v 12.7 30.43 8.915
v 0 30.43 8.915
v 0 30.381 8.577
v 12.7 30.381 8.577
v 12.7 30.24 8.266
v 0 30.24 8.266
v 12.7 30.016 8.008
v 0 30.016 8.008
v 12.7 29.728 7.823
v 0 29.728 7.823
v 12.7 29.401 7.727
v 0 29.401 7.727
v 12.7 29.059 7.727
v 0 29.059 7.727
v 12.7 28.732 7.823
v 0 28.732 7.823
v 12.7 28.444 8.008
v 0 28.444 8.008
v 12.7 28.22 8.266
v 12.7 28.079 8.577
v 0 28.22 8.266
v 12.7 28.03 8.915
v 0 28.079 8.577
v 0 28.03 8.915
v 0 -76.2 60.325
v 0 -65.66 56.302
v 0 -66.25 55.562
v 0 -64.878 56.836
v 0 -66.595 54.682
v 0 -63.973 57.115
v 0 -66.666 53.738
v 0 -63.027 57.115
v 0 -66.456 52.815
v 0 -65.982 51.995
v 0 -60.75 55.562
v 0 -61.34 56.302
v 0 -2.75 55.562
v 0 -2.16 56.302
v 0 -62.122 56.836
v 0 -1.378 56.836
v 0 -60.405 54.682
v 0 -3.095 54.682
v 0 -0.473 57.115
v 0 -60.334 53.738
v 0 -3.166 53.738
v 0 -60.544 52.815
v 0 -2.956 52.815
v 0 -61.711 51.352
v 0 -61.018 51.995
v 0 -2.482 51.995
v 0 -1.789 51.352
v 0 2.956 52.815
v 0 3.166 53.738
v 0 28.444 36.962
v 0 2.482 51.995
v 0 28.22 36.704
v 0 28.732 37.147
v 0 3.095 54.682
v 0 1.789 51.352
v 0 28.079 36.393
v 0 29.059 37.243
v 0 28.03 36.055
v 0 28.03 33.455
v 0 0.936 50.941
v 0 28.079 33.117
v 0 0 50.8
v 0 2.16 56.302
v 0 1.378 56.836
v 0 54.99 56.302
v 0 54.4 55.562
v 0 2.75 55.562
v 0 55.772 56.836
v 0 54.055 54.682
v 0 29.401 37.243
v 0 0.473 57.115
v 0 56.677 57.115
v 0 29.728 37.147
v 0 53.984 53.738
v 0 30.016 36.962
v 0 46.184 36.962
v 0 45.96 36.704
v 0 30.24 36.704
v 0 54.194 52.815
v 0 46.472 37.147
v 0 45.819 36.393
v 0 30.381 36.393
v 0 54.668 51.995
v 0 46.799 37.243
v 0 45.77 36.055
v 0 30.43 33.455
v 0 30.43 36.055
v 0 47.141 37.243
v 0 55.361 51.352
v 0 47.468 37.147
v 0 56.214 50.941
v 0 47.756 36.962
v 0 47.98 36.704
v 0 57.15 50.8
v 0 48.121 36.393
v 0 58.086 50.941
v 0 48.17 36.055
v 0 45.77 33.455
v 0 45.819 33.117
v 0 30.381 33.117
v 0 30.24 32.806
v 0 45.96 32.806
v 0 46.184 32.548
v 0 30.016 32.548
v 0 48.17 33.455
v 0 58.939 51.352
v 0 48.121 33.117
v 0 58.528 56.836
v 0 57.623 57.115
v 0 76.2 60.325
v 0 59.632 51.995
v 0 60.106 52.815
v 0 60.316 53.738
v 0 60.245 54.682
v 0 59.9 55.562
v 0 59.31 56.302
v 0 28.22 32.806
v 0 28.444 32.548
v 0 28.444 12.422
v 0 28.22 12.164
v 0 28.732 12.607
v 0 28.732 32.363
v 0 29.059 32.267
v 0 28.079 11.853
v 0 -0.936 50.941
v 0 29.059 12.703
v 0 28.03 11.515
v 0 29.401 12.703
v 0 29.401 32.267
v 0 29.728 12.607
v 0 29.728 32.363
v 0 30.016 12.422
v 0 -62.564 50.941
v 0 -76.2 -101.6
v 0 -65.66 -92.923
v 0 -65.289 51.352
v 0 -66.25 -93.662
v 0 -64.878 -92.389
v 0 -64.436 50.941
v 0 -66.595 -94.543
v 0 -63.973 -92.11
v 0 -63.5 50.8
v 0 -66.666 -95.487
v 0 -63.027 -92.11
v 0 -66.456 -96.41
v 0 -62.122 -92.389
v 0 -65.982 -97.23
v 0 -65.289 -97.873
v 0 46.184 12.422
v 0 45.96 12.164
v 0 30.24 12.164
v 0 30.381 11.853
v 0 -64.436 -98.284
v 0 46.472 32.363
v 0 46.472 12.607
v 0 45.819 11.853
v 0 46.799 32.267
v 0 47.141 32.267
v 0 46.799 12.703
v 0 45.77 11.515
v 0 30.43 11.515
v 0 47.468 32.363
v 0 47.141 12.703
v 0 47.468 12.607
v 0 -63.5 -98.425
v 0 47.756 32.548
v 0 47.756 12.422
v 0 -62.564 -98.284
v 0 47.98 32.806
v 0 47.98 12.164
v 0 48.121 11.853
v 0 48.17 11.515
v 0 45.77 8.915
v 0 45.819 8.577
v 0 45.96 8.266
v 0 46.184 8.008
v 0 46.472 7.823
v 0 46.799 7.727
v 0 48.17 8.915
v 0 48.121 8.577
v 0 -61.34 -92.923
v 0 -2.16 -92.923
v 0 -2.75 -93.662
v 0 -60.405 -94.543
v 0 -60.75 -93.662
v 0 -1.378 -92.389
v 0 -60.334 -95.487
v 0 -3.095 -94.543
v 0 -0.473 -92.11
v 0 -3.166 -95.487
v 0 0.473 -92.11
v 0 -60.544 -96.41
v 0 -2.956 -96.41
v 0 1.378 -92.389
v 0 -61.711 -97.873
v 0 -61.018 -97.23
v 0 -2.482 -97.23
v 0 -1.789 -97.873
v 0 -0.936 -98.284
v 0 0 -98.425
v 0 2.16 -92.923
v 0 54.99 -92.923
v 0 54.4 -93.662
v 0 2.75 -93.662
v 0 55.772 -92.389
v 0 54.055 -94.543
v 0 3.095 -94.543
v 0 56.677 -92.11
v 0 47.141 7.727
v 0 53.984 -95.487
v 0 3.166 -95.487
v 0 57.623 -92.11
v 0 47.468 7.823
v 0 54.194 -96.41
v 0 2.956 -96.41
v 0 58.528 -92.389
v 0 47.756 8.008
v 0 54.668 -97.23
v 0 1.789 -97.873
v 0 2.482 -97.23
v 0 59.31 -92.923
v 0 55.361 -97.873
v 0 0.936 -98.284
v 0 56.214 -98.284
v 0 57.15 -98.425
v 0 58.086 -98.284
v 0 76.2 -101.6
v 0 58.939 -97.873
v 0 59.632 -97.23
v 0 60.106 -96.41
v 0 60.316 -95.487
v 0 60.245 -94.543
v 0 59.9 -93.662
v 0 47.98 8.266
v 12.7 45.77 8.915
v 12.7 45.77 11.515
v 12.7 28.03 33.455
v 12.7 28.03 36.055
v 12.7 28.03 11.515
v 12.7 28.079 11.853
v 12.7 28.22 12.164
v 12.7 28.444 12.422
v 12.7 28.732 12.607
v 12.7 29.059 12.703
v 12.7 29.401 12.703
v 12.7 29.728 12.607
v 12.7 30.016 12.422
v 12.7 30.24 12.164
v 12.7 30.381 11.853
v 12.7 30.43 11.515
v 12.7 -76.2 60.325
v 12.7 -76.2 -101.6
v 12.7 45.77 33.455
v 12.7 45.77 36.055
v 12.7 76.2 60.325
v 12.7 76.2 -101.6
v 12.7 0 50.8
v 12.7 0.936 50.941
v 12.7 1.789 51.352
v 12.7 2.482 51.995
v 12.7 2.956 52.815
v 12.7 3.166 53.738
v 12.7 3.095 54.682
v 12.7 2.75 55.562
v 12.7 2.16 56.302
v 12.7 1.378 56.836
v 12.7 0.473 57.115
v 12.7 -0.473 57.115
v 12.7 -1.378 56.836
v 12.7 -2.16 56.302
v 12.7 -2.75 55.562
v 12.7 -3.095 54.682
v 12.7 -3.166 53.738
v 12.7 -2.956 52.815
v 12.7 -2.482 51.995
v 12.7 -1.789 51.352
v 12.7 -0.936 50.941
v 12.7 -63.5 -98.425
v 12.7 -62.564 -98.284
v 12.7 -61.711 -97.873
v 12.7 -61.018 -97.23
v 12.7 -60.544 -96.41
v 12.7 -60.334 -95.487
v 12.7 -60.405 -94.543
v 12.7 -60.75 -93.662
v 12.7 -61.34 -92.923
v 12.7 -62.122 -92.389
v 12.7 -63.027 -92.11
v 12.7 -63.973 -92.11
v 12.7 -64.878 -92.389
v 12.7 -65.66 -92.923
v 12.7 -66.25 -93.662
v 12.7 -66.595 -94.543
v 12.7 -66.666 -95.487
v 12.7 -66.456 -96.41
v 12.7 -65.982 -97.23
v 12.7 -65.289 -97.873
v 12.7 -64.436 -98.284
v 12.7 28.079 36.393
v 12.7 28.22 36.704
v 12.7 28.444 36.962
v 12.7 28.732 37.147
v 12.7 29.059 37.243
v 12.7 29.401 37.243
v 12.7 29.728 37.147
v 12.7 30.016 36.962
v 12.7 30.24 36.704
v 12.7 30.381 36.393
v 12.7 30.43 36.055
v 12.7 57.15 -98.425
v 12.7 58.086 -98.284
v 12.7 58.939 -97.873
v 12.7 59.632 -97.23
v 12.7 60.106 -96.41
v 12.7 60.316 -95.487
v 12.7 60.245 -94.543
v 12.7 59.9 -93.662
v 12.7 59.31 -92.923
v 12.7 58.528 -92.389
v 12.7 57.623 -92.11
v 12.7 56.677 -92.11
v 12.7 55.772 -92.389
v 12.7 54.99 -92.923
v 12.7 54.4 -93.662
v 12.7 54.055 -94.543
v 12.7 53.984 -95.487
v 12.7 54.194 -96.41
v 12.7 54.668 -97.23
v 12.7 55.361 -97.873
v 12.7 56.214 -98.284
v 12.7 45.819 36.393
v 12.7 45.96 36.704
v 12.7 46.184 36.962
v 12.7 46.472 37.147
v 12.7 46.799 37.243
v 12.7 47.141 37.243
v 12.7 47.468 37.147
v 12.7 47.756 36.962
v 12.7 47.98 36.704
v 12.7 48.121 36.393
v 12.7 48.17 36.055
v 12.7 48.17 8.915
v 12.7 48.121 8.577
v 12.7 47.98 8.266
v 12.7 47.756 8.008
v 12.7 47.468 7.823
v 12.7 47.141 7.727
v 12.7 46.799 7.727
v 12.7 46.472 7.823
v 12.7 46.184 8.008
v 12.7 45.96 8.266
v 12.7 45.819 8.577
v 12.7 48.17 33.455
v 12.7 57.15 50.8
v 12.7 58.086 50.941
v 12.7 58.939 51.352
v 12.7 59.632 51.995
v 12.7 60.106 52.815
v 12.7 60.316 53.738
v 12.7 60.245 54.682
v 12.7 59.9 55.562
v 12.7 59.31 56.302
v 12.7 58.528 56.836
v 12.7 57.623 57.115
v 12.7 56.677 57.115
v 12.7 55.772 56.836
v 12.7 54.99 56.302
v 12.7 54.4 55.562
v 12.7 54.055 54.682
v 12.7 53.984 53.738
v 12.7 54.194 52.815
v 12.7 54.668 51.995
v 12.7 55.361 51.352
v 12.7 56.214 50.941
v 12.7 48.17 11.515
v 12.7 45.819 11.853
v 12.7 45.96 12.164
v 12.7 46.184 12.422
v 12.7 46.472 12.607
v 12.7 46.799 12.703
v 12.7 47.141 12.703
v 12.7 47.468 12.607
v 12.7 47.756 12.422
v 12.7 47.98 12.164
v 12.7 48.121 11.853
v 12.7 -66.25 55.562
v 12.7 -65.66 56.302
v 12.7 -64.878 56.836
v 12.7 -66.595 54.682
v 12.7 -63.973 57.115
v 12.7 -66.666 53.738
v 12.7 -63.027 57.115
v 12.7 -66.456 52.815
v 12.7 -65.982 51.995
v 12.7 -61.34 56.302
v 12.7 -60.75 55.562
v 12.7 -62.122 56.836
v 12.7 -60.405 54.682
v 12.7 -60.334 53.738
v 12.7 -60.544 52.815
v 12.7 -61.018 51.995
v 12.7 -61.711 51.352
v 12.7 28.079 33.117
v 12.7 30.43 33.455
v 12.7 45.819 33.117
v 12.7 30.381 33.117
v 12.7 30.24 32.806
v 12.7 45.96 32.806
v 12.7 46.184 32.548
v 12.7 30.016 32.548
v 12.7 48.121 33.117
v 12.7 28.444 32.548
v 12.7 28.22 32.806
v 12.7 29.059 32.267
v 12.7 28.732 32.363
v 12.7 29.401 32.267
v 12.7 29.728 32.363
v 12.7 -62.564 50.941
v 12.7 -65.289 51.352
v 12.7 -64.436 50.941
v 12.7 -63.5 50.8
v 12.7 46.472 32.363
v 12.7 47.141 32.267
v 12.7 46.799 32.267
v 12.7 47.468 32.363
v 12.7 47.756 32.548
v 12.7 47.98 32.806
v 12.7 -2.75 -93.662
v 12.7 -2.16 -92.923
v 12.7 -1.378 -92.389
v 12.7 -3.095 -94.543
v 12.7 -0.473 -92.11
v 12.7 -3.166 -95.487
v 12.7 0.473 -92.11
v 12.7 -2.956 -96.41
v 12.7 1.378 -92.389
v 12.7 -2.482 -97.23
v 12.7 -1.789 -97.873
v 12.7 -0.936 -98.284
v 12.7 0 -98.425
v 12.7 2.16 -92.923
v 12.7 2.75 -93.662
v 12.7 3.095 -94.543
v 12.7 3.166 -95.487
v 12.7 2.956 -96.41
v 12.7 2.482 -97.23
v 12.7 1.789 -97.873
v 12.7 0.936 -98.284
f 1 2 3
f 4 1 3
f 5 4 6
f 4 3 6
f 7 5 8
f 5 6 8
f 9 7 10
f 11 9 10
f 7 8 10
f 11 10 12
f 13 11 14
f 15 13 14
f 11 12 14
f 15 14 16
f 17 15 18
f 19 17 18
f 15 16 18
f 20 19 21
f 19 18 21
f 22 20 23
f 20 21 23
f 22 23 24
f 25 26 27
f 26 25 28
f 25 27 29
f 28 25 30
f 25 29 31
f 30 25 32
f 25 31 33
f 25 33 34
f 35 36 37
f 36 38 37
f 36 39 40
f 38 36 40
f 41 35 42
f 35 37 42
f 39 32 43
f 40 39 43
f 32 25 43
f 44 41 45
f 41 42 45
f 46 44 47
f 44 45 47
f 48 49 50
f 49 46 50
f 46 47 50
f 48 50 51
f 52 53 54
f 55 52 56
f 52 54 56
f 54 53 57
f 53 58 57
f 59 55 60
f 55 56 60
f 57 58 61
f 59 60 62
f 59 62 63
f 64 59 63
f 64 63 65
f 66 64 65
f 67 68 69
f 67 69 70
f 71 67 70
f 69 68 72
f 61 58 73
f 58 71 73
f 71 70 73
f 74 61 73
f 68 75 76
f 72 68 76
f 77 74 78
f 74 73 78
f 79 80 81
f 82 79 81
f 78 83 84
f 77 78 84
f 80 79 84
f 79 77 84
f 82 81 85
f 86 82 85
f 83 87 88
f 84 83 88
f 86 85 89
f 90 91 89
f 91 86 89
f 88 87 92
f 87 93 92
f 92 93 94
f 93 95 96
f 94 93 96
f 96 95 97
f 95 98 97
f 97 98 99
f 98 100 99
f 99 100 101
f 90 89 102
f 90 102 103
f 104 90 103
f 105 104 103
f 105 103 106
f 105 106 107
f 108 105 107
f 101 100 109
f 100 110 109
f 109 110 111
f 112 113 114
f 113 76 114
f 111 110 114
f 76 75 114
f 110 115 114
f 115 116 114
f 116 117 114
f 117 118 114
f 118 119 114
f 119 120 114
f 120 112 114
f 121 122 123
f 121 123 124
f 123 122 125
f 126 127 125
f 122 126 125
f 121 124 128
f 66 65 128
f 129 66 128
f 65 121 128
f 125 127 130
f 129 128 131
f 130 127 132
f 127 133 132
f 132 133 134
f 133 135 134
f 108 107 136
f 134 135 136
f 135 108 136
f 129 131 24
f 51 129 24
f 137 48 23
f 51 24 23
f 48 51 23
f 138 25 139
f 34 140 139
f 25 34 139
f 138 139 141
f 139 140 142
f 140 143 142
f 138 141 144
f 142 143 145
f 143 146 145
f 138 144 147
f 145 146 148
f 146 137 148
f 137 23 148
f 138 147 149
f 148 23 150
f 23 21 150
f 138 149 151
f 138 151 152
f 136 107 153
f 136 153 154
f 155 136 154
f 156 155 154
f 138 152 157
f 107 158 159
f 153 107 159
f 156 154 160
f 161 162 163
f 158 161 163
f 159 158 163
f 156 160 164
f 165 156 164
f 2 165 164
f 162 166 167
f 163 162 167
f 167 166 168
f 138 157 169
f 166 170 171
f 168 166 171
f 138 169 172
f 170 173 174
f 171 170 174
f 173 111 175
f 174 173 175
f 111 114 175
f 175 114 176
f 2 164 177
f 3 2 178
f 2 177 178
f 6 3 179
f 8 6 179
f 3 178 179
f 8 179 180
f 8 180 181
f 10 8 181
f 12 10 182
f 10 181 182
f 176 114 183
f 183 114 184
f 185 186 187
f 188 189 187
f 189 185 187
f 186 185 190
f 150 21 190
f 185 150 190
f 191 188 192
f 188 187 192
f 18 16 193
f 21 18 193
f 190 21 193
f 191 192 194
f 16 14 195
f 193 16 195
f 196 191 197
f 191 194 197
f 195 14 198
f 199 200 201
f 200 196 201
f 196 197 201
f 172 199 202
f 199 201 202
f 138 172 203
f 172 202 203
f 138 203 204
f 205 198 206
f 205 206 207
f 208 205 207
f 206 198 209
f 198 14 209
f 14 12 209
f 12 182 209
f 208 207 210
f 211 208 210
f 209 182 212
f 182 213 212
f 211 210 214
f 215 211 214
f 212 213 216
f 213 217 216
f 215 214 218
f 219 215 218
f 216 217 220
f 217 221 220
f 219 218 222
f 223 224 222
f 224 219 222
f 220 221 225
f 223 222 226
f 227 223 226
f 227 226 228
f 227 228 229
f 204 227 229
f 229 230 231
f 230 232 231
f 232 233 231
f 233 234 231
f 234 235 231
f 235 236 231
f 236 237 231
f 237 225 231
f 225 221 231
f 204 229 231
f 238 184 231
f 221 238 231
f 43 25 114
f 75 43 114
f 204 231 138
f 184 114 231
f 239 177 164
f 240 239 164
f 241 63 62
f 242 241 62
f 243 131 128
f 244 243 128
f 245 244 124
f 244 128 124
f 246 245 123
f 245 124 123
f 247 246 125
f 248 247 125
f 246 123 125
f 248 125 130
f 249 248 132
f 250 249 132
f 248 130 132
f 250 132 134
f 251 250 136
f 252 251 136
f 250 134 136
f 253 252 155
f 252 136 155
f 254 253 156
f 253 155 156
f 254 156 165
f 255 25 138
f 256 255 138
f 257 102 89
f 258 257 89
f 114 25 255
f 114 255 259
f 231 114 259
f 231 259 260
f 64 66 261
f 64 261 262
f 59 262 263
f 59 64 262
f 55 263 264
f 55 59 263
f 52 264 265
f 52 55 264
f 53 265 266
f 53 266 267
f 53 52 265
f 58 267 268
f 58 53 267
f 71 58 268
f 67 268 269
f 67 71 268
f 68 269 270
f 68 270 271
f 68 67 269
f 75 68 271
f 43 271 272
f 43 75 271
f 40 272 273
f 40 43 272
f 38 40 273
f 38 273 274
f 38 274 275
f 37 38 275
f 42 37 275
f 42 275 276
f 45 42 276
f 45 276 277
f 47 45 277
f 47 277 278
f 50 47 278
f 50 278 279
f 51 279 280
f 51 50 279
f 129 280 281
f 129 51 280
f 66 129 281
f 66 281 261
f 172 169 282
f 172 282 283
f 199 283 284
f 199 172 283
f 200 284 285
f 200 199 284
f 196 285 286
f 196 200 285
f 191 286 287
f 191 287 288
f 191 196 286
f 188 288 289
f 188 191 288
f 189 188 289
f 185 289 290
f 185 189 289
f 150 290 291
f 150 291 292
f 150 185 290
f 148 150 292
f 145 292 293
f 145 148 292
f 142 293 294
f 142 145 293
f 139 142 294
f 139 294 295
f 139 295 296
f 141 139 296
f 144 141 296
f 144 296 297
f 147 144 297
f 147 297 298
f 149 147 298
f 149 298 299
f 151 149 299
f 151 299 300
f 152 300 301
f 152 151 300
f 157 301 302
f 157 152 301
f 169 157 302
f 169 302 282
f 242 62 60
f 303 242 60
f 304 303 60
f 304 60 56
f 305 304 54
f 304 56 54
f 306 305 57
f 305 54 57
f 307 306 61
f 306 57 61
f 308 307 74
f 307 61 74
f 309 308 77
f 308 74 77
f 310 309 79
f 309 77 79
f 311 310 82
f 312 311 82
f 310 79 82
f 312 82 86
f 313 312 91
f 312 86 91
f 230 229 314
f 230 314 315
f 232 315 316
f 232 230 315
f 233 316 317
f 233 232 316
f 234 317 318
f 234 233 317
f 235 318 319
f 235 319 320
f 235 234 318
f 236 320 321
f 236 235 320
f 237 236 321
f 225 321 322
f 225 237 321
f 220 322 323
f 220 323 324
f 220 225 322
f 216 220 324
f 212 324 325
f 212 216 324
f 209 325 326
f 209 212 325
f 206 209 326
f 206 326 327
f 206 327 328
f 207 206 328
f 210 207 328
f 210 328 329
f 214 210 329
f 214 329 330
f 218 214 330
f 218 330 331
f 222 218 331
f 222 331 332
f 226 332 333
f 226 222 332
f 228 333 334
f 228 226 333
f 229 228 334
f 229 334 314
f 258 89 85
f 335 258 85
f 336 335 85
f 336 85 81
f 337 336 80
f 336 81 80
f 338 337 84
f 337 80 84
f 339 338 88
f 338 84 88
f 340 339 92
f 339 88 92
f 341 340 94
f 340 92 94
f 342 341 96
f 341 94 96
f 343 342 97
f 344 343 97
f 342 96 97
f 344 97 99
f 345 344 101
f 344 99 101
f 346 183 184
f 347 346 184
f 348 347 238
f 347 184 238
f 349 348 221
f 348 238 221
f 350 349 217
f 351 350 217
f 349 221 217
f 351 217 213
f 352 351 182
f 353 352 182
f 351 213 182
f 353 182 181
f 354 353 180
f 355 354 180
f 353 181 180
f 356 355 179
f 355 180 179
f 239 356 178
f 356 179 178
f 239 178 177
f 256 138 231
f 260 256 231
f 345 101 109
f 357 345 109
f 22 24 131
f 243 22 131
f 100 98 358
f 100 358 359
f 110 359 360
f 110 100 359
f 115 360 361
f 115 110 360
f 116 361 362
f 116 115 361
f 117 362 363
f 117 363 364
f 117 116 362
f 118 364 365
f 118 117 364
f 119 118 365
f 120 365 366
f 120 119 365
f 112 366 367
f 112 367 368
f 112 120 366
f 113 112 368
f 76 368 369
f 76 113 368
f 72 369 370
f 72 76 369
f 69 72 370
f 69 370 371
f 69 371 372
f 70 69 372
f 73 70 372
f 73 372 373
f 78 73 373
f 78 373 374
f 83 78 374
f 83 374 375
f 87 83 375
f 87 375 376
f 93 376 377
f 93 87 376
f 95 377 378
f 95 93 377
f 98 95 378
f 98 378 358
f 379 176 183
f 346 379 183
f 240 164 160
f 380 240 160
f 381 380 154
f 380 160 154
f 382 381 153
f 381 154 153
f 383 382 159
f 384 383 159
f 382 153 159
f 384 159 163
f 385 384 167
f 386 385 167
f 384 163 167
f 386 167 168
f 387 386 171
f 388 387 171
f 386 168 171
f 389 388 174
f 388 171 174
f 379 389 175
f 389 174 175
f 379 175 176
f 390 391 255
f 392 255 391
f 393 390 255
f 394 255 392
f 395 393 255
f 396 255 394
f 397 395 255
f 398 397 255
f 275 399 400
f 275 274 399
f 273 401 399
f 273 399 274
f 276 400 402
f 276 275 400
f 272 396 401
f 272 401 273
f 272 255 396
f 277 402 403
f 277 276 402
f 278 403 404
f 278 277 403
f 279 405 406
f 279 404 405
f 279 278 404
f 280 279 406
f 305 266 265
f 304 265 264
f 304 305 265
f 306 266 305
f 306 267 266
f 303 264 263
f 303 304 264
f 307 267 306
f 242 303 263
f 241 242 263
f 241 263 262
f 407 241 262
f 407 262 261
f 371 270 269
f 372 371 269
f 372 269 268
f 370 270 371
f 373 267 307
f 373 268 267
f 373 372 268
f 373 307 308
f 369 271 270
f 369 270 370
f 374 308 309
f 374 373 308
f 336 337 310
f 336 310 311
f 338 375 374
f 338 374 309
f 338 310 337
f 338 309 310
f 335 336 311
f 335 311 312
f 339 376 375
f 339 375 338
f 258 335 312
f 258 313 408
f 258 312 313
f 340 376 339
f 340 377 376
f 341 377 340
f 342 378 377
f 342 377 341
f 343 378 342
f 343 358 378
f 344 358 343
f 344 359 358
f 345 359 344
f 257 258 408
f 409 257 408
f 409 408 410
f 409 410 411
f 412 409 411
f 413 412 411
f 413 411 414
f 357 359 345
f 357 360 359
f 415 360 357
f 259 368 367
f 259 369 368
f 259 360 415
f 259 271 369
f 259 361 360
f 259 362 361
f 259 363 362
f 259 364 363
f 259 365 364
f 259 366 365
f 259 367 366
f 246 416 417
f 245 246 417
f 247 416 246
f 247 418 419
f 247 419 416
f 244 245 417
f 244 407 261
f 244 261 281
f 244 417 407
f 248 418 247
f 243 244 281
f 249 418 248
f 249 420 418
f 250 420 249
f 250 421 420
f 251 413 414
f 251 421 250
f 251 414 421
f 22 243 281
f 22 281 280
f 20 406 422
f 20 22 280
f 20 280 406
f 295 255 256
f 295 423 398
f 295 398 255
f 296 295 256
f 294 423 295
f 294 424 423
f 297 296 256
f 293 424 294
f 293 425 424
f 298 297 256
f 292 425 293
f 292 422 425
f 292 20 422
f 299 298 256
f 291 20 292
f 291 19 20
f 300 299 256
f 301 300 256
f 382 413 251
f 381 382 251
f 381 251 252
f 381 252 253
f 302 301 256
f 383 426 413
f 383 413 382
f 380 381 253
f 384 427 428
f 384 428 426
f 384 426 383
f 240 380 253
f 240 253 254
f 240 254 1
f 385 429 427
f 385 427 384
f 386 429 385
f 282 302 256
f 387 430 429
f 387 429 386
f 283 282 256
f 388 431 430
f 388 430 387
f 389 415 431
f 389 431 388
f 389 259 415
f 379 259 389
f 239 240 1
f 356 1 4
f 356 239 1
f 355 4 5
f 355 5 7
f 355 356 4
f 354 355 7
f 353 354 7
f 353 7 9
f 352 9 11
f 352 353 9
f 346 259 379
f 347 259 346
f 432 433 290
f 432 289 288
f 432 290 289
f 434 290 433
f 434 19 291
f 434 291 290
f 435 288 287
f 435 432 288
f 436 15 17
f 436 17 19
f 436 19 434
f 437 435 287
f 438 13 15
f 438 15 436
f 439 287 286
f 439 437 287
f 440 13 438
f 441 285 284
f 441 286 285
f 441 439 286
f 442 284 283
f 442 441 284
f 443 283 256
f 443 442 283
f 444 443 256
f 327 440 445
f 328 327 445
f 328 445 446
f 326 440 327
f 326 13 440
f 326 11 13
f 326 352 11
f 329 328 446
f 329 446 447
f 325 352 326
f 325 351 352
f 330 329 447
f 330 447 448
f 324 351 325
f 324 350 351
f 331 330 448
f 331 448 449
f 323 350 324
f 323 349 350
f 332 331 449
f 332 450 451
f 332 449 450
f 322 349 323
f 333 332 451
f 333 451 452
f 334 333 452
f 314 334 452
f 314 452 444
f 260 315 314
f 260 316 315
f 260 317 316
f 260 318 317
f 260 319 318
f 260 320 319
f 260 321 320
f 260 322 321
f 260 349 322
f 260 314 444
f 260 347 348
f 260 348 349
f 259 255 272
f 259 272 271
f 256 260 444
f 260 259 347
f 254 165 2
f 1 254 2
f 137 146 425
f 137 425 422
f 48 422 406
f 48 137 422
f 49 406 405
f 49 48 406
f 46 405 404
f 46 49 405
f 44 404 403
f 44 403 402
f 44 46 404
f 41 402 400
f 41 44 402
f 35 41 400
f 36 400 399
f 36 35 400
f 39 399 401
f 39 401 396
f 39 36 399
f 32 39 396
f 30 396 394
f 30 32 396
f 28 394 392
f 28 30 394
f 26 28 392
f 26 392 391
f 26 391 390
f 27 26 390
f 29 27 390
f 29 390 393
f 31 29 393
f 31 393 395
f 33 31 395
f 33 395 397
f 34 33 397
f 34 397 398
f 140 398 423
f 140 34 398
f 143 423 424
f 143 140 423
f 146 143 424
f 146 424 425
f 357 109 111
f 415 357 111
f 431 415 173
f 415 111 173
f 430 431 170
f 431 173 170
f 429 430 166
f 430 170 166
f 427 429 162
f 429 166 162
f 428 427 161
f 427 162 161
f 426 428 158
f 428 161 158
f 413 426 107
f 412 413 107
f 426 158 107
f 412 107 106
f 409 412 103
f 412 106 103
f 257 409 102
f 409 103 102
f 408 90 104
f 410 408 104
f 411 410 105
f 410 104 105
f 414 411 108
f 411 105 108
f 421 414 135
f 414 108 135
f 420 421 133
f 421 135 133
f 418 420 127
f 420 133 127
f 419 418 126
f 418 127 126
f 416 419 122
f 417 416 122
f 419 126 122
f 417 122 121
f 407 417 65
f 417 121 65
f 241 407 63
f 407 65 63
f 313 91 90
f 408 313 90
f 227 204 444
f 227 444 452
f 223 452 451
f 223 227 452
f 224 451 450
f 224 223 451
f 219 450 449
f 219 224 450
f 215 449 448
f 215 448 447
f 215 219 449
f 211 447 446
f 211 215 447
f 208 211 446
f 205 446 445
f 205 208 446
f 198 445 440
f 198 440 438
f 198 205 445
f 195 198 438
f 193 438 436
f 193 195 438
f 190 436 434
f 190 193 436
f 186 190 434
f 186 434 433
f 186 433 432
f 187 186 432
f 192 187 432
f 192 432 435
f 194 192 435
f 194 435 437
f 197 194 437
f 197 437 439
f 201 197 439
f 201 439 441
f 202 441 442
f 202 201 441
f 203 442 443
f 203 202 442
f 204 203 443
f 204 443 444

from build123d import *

# Parameters (mm, degrees)
SKETCH1_W           = 161.925
SKETCH1_H           = 152.4
SKETCH1_R           = 3.175
BOSS_EXTRUDE1_DEPTH = 12.7


with BuildPart() as part:
    # Sketch1 → Boss-Extrude1 (new body)
    with BuildSketch(Plane(origin=(0, 0, 0), x_dir=(0, 0, -1), z_dir=(1, 0, 0))):
        with Locations((20.6375, 0)):
            Rectangle(SKETCH1_W, SKETCH1_H)
        with Locations((95.25, -63.5)):
            Circle(SKETCH1_R, mode=Mode.SUBTRACT)
        with Locations((95.25, 0)):
            Circle(SKETCH1_R, mode=Mode.SUBTRACT)
        with Locations((-53.975, -63.5)):
            Circle(SKETCH1_R, mode=Mode.SUBTRACT)
        with Locations((-53.975, 0)):
            Circle(SKETCH1_R, mode=Mode.SUBTRACT)
        with Locations((95.25, 57.15)):
            Circle(SKETCH1_R, mode=Mode.SUBTRACT)
        with Locations((-53.975, 57.15)):
            Circle(SKETCH1_R, mode=Mode.SUBTRACT)
        with BuildLine():
            ThreePointArc((-33.455, 30.43), (-32.255, 29.23), (-33.455, 28.03))
            Line((-33.455, 28.03), (-36.055, 28.03))
            ThreePointArc((-36.055, 28.03), (-37.255, 29.23), (-36.055, 30.43))
            Line((-36.055, 30.43), (-33.455, 30.43))
        make_face(mode=Mode.SUBTRACT)
        with BuildLine():
            Line((-8.915, 28.03), (-11.515, 28.03))
            ThreePointArc((-11.515, 28.03), (-12.715, 29.23), (-11.515, 30.43))
            Line((-11.515, 30.43), (-8.915, 30.43))
            ThreePointArc((-8.915, 30.43), (-7.715, 29.23), (-8.915, 28.03))
        make_face(mode=Mode.SUBTRACT)
        with BuildLine():
            Line((-36.055, 48.17), (-33.455, 48.17))
            ThreePointArc((-33.455, 48.17), (-32.255, 46.97), (-33.455, 45.77))
            Line((-33.455, 45.77), (-36.055, 45.77))
            ThreePointArc((-36.055, 45.77), (-37.255, 46.97), (-36.055, 48.17))
        make_face(mode=Mode.SUBTRACT)
        with BuildLine():
            ThreePointArc((-8.915, 48.17), (-7.715, 46.97), (-8.915, 45.77))
            Line((-8.915, 45.77), (-11.515, 45.77))
            ThreePointArc((-11.515, 45.77), (-12.715, 46.97), (-11.515, 48.17))
            Line((-11.515, 48.17), (-8.915, 48.17))
        make_face(mode=Mode.SUBTRACT)
    extrude(amount=BOSS_EXTRUDE1_DEPTH)


solid = part.part
